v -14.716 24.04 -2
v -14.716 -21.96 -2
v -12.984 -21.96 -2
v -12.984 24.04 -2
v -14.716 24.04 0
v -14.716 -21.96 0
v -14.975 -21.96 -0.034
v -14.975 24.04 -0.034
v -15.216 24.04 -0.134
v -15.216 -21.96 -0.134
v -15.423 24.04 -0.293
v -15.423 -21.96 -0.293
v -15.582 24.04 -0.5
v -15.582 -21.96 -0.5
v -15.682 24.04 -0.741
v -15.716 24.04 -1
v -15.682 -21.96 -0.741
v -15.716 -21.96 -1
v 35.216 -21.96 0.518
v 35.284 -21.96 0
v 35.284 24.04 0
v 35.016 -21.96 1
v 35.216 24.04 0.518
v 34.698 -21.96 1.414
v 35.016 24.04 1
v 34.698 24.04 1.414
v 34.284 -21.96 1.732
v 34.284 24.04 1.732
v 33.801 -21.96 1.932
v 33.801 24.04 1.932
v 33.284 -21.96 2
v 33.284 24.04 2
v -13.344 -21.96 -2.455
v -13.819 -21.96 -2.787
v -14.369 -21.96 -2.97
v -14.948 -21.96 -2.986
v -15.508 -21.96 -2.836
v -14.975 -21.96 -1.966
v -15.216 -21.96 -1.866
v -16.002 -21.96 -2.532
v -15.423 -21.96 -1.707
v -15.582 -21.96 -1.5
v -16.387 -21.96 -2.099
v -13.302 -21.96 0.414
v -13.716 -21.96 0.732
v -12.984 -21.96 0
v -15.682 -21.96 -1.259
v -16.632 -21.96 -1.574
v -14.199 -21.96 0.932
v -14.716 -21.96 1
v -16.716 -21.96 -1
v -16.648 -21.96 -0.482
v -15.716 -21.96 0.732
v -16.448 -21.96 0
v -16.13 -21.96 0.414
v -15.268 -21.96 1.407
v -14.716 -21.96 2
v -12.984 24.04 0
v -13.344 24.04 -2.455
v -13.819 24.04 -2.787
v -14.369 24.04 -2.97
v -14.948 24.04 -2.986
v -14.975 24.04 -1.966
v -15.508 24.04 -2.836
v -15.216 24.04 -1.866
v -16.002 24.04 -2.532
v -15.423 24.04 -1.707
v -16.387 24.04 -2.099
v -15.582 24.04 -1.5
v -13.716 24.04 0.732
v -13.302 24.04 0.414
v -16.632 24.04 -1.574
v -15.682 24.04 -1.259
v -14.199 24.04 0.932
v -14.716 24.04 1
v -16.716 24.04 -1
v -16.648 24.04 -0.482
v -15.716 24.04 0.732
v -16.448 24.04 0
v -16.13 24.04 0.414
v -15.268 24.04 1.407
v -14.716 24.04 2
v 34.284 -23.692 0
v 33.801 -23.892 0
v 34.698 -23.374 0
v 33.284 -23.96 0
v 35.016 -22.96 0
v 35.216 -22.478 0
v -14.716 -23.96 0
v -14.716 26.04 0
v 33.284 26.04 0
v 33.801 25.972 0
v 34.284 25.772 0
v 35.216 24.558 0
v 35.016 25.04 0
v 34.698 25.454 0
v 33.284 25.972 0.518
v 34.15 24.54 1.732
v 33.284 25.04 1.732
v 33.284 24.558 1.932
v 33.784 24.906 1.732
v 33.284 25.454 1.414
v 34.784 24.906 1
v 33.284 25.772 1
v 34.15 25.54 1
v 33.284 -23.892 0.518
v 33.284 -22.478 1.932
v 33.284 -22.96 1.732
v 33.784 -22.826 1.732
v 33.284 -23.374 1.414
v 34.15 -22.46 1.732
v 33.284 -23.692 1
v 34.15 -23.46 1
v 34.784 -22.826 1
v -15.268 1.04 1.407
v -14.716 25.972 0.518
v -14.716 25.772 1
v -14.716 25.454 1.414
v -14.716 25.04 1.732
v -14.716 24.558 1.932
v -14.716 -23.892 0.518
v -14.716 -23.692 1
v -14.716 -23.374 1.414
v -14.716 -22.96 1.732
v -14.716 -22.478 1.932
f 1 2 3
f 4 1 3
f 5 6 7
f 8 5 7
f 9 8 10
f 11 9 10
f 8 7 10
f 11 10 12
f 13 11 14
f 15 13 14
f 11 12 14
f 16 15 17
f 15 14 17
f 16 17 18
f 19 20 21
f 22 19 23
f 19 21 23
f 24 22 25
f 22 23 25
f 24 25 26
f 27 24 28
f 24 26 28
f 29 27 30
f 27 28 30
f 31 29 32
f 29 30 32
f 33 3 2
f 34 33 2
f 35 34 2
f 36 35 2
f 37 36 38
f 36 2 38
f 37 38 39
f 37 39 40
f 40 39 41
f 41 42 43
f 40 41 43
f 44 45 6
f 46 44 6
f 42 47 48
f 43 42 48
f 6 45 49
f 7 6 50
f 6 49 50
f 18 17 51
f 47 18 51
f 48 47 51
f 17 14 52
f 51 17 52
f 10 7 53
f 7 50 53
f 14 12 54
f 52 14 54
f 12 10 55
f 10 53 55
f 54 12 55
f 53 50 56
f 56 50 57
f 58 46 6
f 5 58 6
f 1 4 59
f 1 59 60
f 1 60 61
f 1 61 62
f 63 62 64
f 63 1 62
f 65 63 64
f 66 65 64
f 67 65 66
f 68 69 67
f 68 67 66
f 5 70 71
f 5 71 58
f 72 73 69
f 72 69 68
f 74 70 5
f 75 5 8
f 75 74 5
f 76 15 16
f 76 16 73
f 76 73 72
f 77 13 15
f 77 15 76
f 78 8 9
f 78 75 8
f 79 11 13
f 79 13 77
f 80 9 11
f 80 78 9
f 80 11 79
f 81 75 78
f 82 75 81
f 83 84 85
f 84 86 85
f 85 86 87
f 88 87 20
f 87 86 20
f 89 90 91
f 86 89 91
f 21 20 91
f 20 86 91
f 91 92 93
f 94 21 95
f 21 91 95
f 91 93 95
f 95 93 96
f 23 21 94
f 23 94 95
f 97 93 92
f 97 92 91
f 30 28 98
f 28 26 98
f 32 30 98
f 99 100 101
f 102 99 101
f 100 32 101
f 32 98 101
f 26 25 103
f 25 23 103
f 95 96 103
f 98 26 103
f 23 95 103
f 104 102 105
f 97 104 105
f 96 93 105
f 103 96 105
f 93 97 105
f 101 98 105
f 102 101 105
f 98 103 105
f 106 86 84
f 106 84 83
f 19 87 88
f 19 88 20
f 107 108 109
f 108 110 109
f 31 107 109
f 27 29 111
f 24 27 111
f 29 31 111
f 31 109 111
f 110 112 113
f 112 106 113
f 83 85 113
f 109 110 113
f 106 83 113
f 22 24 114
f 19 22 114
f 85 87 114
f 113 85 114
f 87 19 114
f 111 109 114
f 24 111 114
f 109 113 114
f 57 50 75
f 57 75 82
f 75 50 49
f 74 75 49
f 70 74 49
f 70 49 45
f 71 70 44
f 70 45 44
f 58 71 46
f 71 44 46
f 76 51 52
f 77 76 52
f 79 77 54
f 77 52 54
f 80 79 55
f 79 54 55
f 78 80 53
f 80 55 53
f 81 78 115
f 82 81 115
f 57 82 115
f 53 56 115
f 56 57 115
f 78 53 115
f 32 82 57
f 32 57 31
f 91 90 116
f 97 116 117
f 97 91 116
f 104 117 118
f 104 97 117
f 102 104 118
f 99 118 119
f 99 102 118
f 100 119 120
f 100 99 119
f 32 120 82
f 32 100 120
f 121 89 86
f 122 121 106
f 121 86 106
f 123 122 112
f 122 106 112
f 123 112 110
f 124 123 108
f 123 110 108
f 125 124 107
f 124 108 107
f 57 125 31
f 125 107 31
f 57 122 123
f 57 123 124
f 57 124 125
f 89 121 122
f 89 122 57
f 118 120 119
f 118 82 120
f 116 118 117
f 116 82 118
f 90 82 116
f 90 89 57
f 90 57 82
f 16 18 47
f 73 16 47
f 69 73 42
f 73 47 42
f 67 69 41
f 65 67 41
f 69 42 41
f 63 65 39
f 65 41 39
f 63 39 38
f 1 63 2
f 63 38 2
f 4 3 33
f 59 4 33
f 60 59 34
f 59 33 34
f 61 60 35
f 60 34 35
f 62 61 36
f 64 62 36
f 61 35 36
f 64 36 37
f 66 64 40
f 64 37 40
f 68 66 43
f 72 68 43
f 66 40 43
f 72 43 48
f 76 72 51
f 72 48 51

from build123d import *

# Parameters (mm, degrees)
F0_W         = 50
F0_H         = 50
F1_DEPTH     = 2
F2_W         = 2
F2_H         = 1
F3_DEPTH     = 25
F5_DEPTH     = 46
F6_DEPTH     = 25
F8_DEPTH     = 46
F10_DEPTH    = 46
F11_T1_DEPTH = 52.3397459622
F12_R        = 1.99999
F13_T1_DEPTH = 7
F13_T4_ANGLE = 90
F13_T6_ANGLE = 90


# Not quite as in the source:
# - a fillet or chamfer that OpenCascade refuses, or shapes differently, is made with other operations: its cross-section is extruded or revolved along the edge and cut away or added
# - a fillet or chamfer is up to 0.001 mm smaller than in the source, because OpenCascade refuses the exact size


with BuildPart() as f1:
    # F0 (on Top) → F1 (new body)
    with BuildSketch(Plane.XY):
        with Locations((10.2837480605, 1.0400783271)):
            Rectangle(F0_W, F0_H)
    extrude(amount=F1_DEPTH)

    # F12 (radius 2 in the source; OpenCascade refuses exactly that, so slightly less here)
    f12_edges = [f1.edges().sort_by_distance(p)[0] for p in [
        (10.283748, -23.959922, 2),
        (35.283748, 1.040078, 2),
        (10.283748, 26.040078, 2),
    ]]
    fillet(f12_edges, radius=F12_R)

    # F13: fillet of radius 2 on 4 edges, made by hand

    # F13_s2 → F13_t1 (cut)
    with BuildSketch(Plane.XY.offset(-5)):
        with BuildLine():
            ThreePointArc((33.2837480605, -23.9599216729), (34.6979616228, -23.3741352353), (35.2837480605, -21.9599216729))
            Line((35.2837480605, -21.9599216729), (35.2837480605, -23.9599216729))
            Line((35.2837480605, -23.9599216729), (33.2837480605, -23.9599216729))
        make_face()
        with BuildLine():
            ThreePointArc((35.2837480605, 24.0400783271), (34.6979616228, 25.4542918894), (33.2837480605, 26.0400783271))
            Line((33.2837480605, 26.0400783271), (35.2837480605, 26.0400783271))
            Line((35.2837480605, 26.0400783271), (35.2837480605, 24.0400783271))
        make_face()
    extrude(amount=F13_T1_DEPTH, mode=Mode.SUBTRACT)

    # F13_s3 → F13_t4 (revolve, cut)
    with BuildSketch(Plane.YZ.offset(33.2837480605)):
        with BuildLine():
            ThreePointArc((-21.9599316729, 2), (-23.3741381642, 1.4142164913), (-23.9599216729, 1e-05))
            Line((-23.9599216729, 1e-05), (-23.9599216729, 2))
            Line((-23.9599216729, 2), (-21.9599316729, 2))
        make_face()
    revolve(axis=Axis((33.2837480605, -21.9599216729, 2), (0, 0, 1)), revolution_arc=F13_T4_ANGLE, mode=Mode.SUBTRACT)

    # F13_s5 → F13_t6 (revolve, cut)
    with BuildSketch(Plane.XZ.offset(-24.0400783271)):
        with BuildLine():
            ThreePointArc((33.2837580605, 2), (34.6979645518, 1.4142164913), (35.2837480605, 1e-05))
            Line((35.2837480605, 1e-05), (35.2837480605, 2))
            Line((35.2837480605, 2), (33.2837580605, 2))
        make_face()
    revolve(axis=Axis((33.2837480605, 24.0400783271, 2), (0, 0, 1)), revolution_arc=F13_T6_ANGLE, mode=Mode.SUBTRACT)


with BuildPart() as f3:
    # F2 (on face) → F3 (new body)
    with BuildSketch(Plane(origin=(-14.7162519395, 0, 0), x_dir=(0, -1, 0), z_dir=(-1, 0, 0))):
        with Locations((22.9599216729, -0.5)):
            Rectangle(F2_W, F2_H)
    extrude(amount=-F3_DEPTH)

    # F6 (cut): a face of the model
    f6_faces = [f3.faces().sort_by_distance(p)[0] for p in [
        (-14.7162519395, -22.9599216729, -0.5),
    ]]
    extrude(f6_faces, amount=-F6_DEPTH, mode=Mode.SUBTRACT)


with BuildPart() as f5:
    # F4 (on face) → F5 (new body)
    with BuildSketch(Plane(origin=(0, -21.9599216729, 0), x_dir=(-1, 0, 0), z_dir=(0, 1, 0))):
        with BuildLine():
            ThreePointArc((14.7162519395, 0), (15.4233587207, -0.2928932188), (15.7162519395, -1))
            ThreePointArc((15.7162519395, -1), (14.7162519395, -2), (13.7162519395, -1))
            Line((13.7162519395, -1), (12.7162519395, -1))
            ThreePointArc((12.7162519395, -1), (14.7162519395, -3), (16.7162519395, -1))
            ThreePointArc((16.7162519395, -1), (15.2338900297, 0.9318516526), (12.984201132, 0))
            Line((12.984201132, 0), (14.7162519395, 0))
        make_face()
        with BuildLine():
            ThreePointArc((13.7162519395, -1), (14.0091451583, -0.2928932188), (14.7162519395, 0))
            Line((14.7162519395, 0), (12.984201132, 0))
            ThreePointArc((12.984201132, 0), (12.784400287, -0.4823619098), (12.7162519395, -1))
            Line((12.7162519395, -1), (13.7162519395, -1))
        make_face()
    extrude(amount=F5_DEPTH)

    # F7 (on face) → F8 (cut)
    with BuildSketch(Plane.XZ.offset(21.9599216729)):
        with BuildLine():
            ThreePointArc((-13.7162519395, -1), (-14.0091451583, -1.7071067812), (-14.7162519395, -2))
            Line((-14.7162519395, -2), (-12.984201132, -2))
            ThreePointArc((-12.984201132, -2), (-12.784400287, -1.5176380902), (-12.7162519395, -1))
            ThreePointArc((-12.7162519395, -1), (-12.784400287, -0.4823619098), (-12.984201132, 0))
            Line((-12.984201132, 0), (-14.7162519395, 0))
            ThreePointArc((-14.7162519395, 0), (-14.0091451583, -0.2928932188), (-13.7162519395, -1))
        make_face()
    extrude(amount=-F8_DEPTH, mode=Mode.SUBTRACT)

    # F9 (on face) → F10 (join)
    with BuildSketch(Plane.XZ.offset(21.9599216729)):
        with BuildLine():
            ThreePointArc((-15.7162519395, 0.7320508076), (-15.2338900297, 0.9318516526), (-14.7162519395, 1))
            Line((-14.7162519395, 1), (-14.7162519395, 2))
            Line((-14.7162519395, 2), (-15.7162519395, 2))
            Line((-15.7162519395, 2), (-15.7162519395, 0.7320508076))
        make_face()
    extrude(amount=-F10_DEPTH)

    # F11: fillet of radius 5 on 1 edges, made by hand

    # F11_s2 → F11_t1 (cut)
    with BuildSketch(Plane.XZ.offset(-27.2099513081)):
        with BuildLine():
            add(Edge.make_bspline(
                [(-14.7162519395, 2), (-15.319989957, 1.4478409987), (-15.7162519395, 0.7320508076)],
                knots=[0, 0, 0, 1, 1, 1], degree=2, weights=[1, 1, 1]))
            Line((-15.7162519395, 0.7320508076), (-15.8037401736, 0.780484359))
            ThreePointArc((-15.8037401736, 0.780484359), (-15.8162519395, 1.3660254038), (-15.8162519395, 2))
            Line((-15.8162519395, 2), (-15.7162519395, 2.1))
            ThreePointArc((-15.7162519395, 2.1), (-15.2162519395, 2.1), (-14.7837401736, 2.0737925353))
            Line((-14.7837401736, 2.0737925353), (-14.7162519395, 2))
        make_face()
    extrude(amount=F11_T1_DEPTH, mode=Mode.SUBTRACT)


solid = Compound([f1.part, f5.part])
